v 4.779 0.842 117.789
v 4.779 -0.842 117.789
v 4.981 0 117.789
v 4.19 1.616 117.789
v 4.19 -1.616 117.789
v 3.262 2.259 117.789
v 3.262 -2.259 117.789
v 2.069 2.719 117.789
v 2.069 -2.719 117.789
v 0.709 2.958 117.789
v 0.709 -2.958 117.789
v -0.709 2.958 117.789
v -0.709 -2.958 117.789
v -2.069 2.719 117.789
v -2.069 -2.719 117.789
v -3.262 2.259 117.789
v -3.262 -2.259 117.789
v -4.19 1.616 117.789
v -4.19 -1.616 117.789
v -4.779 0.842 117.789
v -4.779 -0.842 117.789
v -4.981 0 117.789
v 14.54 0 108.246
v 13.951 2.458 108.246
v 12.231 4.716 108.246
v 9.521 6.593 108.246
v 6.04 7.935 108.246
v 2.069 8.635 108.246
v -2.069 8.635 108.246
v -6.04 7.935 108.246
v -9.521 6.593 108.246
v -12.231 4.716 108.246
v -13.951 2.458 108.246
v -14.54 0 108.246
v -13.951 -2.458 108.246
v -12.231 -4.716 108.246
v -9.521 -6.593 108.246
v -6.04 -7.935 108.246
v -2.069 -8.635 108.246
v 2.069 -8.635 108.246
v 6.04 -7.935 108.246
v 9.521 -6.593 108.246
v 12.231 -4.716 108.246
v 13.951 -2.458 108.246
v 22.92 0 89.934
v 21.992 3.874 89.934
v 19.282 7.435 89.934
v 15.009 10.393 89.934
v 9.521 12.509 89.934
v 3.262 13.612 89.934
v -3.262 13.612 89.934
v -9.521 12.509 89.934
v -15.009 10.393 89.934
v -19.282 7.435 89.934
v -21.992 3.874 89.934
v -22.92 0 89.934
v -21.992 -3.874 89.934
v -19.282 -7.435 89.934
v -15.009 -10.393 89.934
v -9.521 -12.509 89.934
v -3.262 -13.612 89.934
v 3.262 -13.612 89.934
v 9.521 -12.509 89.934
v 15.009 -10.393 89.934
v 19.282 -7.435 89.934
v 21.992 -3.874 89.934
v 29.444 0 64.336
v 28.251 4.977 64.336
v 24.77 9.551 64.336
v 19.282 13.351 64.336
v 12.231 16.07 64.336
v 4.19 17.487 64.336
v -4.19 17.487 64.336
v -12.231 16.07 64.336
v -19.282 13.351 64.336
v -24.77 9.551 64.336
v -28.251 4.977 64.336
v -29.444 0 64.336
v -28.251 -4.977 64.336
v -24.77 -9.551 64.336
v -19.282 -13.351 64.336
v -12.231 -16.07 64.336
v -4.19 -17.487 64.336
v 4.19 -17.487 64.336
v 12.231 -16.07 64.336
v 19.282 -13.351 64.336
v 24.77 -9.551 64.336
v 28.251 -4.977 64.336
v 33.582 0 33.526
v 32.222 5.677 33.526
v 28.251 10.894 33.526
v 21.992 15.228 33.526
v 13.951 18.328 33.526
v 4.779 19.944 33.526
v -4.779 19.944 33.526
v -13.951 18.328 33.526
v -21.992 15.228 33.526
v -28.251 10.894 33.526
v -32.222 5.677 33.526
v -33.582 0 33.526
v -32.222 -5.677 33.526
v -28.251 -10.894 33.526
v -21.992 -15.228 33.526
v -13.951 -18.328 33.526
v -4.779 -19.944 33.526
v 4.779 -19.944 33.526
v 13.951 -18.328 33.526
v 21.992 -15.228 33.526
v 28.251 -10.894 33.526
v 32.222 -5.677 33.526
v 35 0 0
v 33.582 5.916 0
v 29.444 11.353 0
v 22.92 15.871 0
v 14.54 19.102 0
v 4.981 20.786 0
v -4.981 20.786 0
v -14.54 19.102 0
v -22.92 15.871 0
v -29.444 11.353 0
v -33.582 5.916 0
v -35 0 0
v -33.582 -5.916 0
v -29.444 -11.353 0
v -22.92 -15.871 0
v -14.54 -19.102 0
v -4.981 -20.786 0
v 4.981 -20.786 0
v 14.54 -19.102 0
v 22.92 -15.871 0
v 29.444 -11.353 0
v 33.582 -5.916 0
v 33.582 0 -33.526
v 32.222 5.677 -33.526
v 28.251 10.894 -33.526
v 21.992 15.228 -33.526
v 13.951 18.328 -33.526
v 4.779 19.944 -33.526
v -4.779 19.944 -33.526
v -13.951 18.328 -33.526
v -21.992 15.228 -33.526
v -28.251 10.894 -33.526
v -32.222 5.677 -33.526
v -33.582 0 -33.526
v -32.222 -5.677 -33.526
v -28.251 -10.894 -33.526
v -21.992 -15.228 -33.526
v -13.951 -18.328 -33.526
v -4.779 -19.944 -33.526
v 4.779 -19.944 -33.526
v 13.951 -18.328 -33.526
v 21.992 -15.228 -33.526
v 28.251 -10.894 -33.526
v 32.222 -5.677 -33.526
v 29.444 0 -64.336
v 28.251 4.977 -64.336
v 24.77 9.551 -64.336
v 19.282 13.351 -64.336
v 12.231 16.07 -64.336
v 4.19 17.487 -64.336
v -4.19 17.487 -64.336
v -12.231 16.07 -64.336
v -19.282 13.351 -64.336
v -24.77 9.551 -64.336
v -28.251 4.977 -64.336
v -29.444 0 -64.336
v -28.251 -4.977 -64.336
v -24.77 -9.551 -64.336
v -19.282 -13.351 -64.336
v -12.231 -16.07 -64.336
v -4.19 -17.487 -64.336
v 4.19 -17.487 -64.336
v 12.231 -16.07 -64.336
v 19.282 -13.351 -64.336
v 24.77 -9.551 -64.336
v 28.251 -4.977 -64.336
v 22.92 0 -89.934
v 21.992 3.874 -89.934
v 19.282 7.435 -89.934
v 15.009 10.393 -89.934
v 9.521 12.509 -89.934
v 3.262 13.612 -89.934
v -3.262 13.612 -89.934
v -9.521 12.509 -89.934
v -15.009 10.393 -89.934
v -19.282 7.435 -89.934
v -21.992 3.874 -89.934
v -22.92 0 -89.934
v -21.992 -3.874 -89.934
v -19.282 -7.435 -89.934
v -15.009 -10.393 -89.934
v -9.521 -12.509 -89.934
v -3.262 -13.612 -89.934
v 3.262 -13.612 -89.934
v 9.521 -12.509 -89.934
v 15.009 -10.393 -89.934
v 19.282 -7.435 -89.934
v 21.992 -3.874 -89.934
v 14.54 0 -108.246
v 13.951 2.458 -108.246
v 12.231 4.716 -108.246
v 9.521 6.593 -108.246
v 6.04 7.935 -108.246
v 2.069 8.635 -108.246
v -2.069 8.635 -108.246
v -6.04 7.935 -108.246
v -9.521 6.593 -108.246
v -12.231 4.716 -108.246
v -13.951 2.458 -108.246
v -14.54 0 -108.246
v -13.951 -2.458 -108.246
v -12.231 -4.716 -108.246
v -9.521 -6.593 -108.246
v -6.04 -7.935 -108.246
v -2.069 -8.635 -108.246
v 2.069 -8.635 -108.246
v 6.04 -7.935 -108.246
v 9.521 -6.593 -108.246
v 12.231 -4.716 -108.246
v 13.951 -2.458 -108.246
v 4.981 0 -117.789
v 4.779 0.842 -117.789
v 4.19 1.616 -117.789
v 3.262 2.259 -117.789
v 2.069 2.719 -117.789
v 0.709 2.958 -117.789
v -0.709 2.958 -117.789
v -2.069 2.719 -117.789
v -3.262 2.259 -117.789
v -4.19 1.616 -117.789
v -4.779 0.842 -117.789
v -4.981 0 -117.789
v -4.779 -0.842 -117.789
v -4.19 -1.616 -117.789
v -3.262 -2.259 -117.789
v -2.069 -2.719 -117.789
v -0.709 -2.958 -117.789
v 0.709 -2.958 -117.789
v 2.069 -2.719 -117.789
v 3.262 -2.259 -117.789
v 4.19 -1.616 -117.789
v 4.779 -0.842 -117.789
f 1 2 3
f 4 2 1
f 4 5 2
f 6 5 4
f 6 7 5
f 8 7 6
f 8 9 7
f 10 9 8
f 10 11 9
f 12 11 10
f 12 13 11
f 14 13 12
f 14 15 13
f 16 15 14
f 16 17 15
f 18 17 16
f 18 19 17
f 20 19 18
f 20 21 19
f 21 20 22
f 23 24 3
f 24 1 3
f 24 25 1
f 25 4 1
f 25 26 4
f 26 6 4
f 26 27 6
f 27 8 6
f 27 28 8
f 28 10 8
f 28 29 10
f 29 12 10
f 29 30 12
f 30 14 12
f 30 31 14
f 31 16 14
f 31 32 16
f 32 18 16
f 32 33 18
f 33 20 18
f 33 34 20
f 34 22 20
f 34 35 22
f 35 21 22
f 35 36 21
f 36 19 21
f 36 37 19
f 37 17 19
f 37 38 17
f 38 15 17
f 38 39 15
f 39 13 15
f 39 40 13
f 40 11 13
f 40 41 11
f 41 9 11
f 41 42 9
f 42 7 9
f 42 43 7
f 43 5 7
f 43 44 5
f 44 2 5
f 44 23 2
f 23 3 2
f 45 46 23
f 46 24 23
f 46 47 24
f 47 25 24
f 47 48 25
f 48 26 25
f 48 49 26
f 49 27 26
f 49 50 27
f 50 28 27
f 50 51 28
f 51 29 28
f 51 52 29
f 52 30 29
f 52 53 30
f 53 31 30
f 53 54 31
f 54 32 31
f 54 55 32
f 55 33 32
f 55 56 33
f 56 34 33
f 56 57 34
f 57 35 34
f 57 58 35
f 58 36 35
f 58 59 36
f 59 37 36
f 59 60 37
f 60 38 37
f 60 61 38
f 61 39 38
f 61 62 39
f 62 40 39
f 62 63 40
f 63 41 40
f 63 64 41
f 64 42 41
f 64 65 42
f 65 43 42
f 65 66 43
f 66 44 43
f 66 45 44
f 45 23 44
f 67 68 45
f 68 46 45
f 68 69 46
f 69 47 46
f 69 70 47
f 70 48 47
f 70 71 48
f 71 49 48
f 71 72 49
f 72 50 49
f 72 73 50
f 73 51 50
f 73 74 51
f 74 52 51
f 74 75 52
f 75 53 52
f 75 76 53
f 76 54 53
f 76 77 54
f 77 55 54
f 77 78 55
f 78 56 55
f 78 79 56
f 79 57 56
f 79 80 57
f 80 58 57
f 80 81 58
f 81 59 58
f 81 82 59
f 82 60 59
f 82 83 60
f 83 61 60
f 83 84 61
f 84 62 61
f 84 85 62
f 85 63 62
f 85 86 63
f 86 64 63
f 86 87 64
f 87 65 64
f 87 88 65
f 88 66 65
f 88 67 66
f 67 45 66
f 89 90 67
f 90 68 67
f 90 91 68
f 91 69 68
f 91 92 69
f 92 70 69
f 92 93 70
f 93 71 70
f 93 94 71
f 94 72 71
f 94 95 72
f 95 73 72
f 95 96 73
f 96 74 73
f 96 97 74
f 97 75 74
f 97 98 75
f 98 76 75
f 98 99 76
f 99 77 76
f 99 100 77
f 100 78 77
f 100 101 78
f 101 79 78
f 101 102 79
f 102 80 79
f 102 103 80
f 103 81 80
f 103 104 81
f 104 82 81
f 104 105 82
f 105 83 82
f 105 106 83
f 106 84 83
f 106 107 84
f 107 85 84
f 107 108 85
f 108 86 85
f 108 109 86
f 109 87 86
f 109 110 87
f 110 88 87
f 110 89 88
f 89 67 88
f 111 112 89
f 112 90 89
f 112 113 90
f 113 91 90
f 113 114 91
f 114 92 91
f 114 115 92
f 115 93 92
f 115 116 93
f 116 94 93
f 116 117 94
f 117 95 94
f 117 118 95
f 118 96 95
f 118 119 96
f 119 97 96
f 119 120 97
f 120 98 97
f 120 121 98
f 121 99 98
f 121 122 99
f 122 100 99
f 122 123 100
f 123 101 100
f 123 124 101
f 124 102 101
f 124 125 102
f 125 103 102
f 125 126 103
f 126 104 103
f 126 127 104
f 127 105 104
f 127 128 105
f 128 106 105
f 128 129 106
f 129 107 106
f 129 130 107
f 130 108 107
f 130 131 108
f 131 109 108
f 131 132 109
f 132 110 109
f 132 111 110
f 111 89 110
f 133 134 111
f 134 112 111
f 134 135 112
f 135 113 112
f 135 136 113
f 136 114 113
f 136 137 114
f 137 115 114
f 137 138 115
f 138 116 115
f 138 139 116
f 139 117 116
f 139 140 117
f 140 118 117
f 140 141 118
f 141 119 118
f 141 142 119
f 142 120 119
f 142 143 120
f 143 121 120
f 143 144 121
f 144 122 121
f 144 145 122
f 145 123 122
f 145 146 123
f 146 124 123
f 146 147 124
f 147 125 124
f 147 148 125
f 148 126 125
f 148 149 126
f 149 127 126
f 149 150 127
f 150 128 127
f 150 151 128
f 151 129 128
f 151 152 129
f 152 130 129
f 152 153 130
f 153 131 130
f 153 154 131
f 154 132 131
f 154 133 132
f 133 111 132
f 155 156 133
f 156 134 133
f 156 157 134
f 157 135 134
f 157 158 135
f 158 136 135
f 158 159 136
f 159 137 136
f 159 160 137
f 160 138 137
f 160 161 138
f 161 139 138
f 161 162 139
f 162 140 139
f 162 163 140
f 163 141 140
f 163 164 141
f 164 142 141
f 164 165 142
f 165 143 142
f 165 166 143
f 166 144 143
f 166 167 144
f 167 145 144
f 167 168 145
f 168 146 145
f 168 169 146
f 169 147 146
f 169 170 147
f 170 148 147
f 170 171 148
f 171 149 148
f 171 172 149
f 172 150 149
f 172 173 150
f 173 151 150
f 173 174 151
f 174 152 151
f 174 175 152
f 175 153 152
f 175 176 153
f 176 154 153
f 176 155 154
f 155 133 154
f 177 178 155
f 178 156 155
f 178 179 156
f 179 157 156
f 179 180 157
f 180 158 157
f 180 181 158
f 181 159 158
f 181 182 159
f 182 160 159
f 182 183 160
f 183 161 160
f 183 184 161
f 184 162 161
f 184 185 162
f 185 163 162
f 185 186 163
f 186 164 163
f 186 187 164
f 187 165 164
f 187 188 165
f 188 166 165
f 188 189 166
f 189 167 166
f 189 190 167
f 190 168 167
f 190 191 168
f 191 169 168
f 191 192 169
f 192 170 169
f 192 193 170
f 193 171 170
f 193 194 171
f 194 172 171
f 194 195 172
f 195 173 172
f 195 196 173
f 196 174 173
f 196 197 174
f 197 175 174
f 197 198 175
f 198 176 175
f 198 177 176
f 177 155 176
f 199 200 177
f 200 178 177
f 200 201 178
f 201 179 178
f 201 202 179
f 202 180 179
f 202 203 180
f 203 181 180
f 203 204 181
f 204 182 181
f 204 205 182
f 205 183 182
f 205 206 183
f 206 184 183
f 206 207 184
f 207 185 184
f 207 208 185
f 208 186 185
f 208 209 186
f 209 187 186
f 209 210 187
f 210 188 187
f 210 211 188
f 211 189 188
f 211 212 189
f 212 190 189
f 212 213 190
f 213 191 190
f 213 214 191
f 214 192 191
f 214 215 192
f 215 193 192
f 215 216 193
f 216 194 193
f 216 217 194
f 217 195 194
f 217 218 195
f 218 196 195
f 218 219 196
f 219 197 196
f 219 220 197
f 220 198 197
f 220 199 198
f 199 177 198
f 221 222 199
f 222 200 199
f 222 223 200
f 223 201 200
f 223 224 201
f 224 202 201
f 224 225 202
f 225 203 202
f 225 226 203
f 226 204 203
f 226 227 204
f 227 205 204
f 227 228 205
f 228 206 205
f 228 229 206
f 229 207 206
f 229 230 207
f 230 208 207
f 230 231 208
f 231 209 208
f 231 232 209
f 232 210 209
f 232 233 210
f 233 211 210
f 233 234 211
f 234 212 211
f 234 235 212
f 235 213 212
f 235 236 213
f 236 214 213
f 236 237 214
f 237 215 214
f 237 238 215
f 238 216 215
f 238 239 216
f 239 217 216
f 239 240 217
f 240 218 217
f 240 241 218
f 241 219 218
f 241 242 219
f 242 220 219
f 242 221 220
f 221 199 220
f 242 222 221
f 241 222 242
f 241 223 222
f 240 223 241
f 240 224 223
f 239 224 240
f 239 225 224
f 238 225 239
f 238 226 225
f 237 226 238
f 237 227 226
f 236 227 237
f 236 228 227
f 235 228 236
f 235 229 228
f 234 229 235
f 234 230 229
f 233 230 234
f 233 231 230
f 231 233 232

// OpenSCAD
// Generated by SolidPython 1.0.1 on 2020-07-29 00:46:46


scale(v = [5, 3, 17]) {
	sphere(r = 7);
}
/***********************************************
*********      SolidPython code:      **********
************************************************
 
# import packages: SolidPython
from solid import *
from solid.utils import *
from itertools import chain, combinations, permutations


class Resize:

    def __init__(self, scad_file):
        self.scad_file = scad_file
        #self.scad_file = import_scad(scad_file)
        # cone/cylinder param:
        self.r1 = 0
        self.r2 = 0
        self.h = 0
        # rectangular prism param:
        self.w = 0
        self.l = 0
        # ellipse param:
        self.r = 0

    # import OpenScad code (file name corresponds to shape)


    # classify shape + parameters
    def assign(self, param1, param2, param3):
        if self.scad_file == 'cone.scad':
            self.r1 = param1
            self.r2 = param2
            self.h = param3
        elif self.scad_file == 'cylinder.scad':
            self.r1 = param1
            self.r2 = param2
            self.h = param3
        elif self.scad_file == 'rectangularPrism.scad':
            self.h = param1
            self.l = param2
            self.w = param3
        else:
            self.r = param1
            self.h = param2

    # resize parameters
    def iterate(self):
        x = range(3, 20, 2)
        i = 1
        if self.scad_file == 'cone.scad':
            tempList = list(permutations(x, 2))
            for temp in tempList:
                param1 = temp[0]
                param2 = temp[1]
                filepath = 'produced_scad_files/' + 'cone' + str(param1) + '_' + str(param2) + '_' + '.scad'
                scad_render_to_file(cylinder(h=param1, r1=param2, r2=0), filepath)

        elif self.scad_file == 'cylinder.scad':
            tempList = list(permutations(x, 3))
            for temp in tempList:
                param1 = temp[0]
                param2 = temp[1]
                filepath = 'produced_scad_files/' + 'cylinder' + str(param1) + '_' + str(param2) + '_' + '.scad'
                scad_render_to_file(cylinder(h=param1, r1=param2, r2=param2), filepath)

        elif self.scad_file == 'rectangularPrism.scad':
            tempList = list(permutations(x, 3))
            for temp in tempList:
                param1 = temp[0]
                param2 = temp[1]
                param3 = temp[2]
                filepath = 'produced_scad_files/' + 'rectangularPrism' + str(param1) + '_' + str(param2) + '_' + str(
                    param3) + '.scad'
                scad_render_to_file(cube(size=(param1, param2, param3)), filepath)

        elif self.scad_file == 'ellipse.scad':
            tempList = list(permutations(x, 4))
            for temp in tempList:
                param1 = temp[0]
                param2 = temp[1]
                param3 = temp[2]
                param4 = temp[3]
                filepath = 'produced_scad_files/' + 'ellipse' + str(param1) + '_' + str(param2) + '_' + str(param3) + '_' + str(param4) + '.scad'
                scad_render_to_file(scale([param1, param2, param3])(sphere(r=param4)), filepath)

    def render_to_scadfile(self):
        scad_render_to_file(scad, 'example.scad') 
 
************************************************/
